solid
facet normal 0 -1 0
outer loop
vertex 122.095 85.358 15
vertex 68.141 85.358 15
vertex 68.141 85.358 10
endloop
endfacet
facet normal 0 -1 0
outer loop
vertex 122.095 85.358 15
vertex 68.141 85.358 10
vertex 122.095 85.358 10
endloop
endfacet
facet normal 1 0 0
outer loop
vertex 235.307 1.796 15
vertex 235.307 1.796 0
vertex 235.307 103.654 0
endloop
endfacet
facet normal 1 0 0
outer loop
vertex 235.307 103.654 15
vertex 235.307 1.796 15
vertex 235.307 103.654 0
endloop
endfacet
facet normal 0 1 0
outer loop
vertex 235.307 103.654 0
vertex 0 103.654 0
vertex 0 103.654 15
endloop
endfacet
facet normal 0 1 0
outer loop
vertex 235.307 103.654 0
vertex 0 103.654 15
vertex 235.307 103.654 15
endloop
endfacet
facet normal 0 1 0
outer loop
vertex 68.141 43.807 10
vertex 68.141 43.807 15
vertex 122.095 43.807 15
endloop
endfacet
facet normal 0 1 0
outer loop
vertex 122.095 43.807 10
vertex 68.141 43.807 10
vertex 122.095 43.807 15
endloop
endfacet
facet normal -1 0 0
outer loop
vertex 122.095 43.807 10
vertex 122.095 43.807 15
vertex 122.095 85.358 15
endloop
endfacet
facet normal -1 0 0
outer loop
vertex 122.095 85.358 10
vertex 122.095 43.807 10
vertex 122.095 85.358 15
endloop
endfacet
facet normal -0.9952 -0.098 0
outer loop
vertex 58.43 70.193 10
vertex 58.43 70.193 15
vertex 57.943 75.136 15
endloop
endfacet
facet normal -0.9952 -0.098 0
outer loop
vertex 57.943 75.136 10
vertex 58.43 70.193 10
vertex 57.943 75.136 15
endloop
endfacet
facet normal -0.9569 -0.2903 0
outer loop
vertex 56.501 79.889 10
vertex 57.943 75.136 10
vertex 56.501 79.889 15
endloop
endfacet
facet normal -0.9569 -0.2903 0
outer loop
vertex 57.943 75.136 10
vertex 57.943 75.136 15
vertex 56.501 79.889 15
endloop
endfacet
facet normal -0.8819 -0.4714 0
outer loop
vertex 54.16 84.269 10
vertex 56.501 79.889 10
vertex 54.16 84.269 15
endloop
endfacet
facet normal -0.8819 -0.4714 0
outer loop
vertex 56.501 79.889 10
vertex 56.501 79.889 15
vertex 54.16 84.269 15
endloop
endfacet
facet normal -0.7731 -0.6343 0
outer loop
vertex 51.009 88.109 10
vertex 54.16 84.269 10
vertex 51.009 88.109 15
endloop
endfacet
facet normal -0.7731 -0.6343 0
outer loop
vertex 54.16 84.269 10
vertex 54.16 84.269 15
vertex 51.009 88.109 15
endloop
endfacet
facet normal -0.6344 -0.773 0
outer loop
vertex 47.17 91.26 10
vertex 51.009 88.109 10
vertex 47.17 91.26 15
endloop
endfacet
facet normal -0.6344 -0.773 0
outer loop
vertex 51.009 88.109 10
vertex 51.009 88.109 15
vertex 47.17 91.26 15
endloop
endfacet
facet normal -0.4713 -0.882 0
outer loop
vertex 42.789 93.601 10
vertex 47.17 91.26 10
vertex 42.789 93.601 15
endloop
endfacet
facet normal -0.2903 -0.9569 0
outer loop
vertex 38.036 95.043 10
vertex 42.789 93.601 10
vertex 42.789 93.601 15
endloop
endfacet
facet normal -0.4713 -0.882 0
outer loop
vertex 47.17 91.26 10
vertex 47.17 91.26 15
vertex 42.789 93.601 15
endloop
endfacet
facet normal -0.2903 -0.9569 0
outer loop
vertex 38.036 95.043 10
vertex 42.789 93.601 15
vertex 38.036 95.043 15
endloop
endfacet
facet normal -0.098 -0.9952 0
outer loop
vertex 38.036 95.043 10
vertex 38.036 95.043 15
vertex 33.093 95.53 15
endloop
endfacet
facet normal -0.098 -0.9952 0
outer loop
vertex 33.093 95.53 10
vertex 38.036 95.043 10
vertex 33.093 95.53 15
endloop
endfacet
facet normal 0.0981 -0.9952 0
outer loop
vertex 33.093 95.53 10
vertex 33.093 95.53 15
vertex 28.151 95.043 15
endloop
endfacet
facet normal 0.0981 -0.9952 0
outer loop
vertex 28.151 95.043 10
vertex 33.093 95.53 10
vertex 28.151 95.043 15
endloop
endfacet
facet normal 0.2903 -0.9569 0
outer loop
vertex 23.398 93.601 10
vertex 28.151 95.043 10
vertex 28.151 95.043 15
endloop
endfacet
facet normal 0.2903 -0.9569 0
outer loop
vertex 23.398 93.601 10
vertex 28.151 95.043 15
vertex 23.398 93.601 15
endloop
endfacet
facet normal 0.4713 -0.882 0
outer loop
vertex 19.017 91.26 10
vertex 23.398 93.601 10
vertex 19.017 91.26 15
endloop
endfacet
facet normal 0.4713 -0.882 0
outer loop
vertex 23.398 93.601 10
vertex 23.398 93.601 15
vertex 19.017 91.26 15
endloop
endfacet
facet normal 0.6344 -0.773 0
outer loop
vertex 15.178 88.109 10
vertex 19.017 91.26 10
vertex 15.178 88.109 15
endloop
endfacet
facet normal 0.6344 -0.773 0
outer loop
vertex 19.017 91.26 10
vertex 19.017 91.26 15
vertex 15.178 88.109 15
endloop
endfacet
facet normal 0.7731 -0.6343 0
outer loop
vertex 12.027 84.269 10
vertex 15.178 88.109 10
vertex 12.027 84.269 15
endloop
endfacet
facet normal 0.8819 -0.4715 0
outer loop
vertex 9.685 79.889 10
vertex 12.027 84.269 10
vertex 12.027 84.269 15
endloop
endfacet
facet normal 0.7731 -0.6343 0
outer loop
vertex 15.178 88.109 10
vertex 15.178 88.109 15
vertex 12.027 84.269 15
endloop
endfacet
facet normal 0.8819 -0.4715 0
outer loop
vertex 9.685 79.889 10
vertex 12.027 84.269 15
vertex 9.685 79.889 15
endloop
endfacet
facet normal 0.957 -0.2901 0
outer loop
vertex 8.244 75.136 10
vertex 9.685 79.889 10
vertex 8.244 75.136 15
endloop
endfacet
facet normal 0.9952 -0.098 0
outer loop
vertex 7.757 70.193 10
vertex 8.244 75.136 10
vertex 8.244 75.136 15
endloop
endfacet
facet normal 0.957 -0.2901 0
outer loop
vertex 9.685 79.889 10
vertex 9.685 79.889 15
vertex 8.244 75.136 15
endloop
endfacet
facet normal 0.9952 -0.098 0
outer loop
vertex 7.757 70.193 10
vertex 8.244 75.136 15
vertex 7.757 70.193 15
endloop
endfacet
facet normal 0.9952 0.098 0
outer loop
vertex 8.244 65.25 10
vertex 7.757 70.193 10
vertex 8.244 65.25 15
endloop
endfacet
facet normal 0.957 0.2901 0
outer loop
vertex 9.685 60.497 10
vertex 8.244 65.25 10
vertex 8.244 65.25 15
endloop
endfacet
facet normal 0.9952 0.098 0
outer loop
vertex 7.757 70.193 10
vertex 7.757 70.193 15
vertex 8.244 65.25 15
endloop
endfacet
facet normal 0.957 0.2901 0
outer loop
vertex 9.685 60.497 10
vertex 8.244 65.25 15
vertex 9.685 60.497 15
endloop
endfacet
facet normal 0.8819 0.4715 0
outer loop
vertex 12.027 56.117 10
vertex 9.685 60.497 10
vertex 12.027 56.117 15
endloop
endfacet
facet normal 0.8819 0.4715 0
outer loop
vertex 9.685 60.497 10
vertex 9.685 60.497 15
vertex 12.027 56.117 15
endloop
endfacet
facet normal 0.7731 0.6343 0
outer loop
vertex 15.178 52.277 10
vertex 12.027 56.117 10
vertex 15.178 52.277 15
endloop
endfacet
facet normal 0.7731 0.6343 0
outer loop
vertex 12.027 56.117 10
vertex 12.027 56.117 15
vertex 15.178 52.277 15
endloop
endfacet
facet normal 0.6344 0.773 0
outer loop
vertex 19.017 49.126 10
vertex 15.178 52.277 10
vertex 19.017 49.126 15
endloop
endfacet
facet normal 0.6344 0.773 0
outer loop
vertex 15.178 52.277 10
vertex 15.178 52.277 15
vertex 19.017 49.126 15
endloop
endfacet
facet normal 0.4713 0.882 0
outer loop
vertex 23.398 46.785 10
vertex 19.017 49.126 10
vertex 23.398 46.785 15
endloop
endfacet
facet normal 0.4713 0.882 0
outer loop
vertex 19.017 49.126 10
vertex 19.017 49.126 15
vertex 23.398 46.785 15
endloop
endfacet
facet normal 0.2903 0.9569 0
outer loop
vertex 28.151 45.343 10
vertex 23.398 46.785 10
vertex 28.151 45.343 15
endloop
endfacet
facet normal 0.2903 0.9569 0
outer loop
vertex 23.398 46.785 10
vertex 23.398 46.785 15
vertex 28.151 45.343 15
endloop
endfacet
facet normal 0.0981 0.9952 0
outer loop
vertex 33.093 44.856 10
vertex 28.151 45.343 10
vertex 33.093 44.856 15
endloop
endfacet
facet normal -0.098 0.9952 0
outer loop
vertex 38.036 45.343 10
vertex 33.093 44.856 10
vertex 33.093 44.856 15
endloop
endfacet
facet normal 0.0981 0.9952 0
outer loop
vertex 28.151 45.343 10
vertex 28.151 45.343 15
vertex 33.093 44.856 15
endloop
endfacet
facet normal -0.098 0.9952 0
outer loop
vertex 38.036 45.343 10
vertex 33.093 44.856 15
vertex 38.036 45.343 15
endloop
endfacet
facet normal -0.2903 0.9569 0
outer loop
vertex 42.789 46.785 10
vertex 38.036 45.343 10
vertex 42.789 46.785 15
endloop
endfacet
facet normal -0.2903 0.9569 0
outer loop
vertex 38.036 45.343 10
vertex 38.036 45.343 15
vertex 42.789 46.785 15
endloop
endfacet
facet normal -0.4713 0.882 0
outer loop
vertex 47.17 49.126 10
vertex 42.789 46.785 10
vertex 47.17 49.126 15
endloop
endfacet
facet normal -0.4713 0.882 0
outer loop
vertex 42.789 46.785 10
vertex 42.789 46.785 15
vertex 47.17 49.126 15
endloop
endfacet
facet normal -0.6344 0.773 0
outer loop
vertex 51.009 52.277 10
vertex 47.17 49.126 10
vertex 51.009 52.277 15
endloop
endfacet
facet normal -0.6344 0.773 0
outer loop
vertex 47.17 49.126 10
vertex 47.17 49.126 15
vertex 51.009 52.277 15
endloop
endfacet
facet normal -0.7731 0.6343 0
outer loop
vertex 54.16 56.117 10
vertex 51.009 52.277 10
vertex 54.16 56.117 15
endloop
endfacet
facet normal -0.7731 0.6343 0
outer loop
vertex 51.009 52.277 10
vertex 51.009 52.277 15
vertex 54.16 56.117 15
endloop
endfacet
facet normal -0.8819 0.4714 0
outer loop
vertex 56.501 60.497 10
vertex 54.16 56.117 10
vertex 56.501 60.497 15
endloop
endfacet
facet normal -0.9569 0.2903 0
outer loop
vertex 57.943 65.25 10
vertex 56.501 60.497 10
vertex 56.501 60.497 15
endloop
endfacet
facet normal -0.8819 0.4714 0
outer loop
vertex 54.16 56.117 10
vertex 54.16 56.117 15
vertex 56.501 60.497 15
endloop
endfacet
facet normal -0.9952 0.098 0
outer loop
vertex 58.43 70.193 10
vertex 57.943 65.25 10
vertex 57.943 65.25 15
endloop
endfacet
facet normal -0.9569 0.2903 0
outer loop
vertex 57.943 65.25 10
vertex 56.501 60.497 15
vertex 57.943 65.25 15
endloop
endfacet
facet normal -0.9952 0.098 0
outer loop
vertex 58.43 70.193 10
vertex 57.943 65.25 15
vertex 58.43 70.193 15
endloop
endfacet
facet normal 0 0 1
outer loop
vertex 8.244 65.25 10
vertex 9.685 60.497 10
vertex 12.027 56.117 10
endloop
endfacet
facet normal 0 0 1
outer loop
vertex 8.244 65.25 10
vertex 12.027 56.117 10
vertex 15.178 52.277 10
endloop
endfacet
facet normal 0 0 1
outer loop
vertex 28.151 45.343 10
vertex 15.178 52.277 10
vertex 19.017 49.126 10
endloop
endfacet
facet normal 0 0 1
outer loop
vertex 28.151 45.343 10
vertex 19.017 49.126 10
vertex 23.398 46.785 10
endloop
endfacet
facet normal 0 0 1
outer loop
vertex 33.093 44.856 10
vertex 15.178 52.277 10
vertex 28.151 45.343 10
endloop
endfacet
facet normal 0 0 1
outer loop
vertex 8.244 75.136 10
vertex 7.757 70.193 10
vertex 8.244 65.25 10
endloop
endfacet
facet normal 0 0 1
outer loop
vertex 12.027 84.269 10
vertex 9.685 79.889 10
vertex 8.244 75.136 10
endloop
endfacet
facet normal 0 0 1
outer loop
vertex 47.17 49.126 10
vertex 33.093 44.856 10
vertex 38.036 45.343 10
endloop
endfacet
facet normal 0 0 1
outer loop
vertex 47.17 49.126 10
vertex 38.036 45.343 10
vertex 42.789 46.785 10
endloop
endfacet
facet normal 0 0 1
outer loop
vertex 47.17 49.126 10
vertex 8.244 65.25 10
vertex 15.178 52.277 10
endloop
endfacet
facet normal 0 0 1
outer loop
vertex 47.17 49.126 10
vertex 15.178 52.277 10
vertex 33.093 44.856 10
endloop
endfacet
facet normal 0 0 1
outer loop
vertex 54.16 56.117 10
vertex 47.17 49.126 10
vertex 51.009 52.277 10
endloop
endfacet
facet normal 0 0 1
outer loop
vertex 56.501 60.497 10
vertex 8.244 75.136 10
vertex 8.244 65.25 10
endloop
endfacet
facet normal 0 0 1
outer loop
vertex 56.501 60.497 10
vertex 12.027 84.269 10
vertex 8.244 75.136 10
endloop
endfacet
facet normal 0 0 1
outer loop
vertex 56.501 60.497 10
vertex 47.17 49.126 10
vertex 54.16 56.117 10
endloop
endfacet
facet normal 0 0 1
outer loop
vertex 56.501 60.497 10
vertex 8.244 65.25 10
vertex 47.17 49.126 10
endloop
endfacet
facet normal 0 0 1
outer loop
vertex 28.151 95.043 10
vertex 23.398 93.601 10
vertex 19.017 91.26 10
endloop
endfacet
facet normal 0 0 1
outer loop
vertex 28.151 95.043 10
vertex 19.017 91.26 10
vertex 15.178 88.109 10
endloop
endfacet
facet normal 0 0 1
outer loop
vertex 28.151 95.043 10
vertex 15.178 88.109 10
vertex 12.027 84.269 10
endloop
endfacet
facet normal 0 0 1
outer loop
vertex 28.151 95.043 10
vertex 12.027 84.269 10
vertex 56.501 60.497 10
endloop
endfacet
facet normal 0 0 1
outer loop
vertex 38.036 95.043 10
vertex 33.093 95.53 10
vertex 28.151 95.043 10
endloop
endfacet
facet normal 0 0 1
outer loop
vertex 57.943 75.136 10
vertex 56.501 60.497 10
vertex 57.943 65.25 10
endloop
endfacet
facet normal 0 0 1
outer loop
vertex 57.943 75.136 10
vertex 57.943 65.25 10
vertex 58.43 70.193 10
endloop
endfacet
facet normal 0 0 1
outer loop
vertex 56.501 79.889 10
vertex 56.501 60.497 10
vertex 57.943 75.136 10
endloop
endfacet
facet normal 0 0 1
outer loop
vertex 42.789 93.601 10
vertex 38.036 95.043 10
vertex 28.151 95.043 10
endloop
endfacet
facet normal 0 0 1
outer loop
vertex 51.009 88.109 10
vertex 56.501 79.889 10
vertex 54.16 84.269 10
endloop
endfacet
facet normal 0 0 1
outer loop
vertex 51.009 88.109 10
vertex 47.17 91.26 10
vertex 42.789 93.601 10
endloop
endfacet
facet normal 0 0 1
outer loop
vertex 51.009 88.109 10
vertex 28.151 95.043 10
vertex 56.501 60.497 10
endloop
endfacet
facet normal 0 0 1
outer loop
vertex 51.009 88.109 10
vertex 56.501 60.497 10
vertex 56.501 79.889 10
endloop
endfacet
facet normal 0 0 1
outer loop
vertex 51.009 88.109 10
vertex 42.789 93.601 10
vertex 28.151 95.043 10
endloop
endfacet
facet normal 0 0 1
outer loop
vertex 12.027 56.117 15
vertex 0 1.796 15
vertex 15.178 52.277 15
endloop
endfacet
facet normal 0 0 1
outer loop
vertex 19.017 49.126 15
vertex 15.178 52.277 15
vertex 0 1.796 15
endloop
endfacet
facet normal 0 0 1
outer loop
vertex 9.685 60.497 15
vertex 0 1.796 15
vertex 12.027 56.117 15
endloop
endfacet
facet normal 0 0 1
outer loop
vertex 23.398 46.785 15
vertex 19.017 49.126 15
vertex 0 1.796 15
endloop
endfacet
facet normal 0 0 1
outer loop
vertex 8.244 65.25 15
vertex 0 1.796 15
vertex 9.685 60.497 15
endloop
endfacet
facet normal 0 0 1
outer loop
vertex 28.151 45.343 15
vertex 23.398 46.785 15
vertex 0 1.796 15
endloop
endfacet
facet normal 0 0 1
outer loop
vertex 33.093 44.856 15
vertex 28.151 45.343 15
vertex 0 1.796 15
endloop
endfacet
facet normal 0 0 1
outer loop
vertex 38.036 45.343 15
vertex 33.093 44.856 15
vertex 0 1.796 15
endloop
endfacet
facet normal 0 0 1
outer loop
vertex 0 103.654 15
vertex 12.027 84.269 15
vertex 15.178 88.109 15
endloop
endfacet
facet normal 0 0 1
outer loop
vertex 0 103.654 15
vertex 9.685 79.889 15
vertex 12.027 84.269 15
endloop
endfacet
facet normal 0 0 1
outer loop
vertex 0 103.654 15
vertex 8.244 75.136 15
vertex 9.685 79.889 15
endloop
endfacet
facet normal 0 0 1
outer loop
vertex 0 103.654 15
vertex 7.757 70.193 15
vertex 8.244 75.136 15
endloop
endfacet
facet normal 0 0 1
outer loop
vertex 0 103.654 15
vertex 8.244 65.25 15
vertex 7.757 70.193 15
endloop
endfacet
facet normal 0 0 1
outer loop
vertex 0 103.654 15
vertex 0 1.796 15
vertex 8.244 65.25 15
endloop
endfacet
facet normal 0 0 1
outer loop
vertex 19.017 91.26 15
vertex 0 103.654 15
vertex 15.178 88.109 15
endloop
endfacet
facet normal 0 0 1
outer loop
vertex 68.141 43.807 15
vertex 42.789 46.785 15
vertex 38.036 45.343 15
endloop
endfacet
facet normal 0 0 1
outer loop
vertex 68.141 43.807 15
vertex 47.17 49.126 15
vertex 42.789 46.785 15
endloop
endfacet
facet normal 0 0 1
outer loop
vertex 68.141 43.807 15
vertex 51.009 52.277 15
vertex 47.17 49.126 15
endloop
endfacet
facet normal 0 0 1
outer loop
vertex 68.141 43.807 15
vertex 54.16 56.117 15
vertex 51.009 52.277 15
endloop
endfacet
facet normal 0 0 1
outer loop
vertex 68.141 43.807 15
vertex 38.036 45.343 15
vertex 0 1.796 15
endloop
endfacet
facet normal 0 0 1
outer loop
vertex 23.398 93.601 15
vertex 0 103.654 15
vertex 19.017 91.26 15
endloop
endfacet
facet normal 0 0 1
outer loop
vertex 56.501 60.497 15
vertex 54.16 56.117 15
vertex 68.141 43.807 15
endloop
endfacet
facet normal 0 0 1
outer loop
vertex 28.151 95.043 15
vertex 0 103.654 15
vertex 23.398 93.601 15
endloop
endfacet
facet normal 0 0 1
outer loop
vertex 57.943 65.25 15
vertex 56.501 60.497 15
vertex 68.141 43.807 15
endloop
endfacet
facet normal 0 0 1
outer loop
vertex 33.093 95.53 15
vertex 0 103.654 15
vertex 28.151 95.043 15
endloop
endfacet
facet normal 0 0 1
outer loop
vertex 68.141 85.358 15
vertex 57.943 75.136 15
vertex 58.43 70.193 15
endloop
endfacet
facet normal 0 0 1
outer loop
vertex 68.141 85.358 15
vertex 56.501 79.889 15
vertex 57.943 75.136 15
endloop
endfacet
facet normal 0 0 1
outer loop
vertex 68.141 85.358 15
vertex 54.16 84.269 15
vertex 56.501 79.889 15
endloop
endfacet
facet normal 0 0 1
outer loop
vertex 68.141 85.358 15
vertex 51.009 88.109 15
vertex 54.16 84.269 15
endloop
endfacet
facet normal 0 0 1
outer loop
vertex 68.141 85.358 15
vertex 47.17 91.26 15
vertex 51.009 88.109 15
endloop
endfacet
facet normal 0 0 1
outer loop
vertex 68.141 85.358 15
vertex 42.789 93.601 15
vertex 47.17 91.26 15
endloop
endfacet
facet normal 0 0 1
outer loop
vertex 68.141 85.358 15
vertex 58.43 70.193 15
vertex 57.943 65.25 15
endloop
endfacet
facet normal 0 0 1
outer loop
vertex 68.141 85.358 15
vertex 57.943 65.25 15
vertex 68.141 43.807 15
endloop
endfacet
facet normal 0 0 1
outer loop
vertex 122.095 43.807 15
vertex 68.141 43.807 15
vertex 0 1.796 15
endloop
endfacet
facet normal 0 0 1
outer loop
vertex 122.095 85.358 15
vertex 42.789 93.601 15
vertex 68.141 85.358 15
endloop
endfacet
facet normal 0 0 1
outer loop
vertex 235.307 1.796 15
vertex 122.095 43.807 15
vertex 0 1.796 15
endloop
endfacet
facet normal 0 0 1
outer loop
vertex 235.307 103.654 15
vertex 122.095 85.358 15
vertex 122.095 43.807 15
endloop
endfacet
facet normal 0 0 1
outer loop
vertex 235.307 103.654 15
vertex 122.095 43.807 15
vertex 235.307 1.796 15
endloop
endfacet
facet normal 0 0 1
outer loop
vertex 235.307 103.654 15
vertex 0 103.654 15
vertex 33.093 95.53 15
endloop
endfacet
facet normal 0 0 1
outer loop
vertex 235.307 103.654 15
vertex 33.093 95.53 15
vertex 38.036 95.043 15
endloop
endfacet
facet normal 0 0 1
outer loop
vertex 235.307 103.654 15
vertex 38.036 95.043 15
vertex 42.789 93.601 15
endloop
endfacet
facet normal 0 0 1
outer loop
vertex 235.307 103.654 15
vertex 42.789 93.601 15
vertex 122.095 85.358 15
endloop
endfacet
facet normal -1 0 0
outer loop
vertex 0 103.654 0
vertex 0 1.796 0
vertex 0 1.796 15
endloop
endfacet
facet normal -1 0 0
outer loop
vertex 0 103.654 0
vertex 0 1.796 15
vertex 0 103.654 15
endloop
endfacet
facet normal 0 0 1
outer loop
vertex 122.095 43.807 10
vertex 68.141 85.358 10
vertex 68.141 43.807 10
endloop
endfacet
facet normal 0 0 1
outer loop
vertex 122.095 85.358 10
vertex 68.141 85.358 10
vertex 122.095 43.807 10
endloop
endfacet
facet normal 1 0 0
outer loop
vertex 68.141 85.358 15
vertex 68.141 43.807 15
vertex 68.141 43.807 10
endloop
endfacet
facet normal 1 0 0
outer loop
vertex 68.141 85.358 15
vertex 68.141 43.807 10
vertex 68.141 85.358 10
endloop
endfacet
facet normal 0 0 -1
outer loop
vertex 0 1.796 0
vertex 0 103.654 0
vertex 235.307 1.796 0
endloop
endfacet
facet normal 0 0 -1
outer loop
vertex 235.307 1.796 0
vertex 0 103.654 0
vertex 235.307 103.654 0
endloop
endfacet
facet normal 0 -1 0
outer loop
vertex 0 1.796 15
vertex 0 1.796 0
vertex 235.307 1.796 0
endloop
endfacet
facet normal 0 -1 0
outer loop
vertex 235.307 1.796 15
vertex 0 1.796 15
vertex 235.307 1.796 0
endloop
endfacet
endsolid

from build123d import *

# Parameters (mm, degrees)
F0_W     = 235.307321
F0_H     = 101.85823
F1_DEPTH = 15
F2_R     = 25.336602
F3_DEPTH = 5
F4_W     = 53.954252
F4_H     = 41.550964
F5_DEPTH = 5


with BuildPart() as f1:
    # F0 (on Top) → F1 (new body)
    with BuildSketch(Plane.XY):
        with Locations((117.653661, 52.72521)):
            Rectangle(F0_W, F0_H)
    extrude(amount=F1_DEPTH)

    # F2 (on face) → F3 (cut)
    with BuildSketch(Plane.XY.offset(15)):
        with Locations((33.09346, 70.193075)):
            Circle(F2_R)
    extrude(amount=-F3_DEPTH, mode=Mode.SUBTRACT)

    # F4 (on face) → F5 (cut)
    with BuildSketch(Plane.XY.offset(15)):
        with Locations((95.118355, 64.582877)):
            Rectangle(F4_W, F4_H)
    extrude(amount=-F5_DEPTH, mode=Mode.SUBTRACT)


solid = f1.part
